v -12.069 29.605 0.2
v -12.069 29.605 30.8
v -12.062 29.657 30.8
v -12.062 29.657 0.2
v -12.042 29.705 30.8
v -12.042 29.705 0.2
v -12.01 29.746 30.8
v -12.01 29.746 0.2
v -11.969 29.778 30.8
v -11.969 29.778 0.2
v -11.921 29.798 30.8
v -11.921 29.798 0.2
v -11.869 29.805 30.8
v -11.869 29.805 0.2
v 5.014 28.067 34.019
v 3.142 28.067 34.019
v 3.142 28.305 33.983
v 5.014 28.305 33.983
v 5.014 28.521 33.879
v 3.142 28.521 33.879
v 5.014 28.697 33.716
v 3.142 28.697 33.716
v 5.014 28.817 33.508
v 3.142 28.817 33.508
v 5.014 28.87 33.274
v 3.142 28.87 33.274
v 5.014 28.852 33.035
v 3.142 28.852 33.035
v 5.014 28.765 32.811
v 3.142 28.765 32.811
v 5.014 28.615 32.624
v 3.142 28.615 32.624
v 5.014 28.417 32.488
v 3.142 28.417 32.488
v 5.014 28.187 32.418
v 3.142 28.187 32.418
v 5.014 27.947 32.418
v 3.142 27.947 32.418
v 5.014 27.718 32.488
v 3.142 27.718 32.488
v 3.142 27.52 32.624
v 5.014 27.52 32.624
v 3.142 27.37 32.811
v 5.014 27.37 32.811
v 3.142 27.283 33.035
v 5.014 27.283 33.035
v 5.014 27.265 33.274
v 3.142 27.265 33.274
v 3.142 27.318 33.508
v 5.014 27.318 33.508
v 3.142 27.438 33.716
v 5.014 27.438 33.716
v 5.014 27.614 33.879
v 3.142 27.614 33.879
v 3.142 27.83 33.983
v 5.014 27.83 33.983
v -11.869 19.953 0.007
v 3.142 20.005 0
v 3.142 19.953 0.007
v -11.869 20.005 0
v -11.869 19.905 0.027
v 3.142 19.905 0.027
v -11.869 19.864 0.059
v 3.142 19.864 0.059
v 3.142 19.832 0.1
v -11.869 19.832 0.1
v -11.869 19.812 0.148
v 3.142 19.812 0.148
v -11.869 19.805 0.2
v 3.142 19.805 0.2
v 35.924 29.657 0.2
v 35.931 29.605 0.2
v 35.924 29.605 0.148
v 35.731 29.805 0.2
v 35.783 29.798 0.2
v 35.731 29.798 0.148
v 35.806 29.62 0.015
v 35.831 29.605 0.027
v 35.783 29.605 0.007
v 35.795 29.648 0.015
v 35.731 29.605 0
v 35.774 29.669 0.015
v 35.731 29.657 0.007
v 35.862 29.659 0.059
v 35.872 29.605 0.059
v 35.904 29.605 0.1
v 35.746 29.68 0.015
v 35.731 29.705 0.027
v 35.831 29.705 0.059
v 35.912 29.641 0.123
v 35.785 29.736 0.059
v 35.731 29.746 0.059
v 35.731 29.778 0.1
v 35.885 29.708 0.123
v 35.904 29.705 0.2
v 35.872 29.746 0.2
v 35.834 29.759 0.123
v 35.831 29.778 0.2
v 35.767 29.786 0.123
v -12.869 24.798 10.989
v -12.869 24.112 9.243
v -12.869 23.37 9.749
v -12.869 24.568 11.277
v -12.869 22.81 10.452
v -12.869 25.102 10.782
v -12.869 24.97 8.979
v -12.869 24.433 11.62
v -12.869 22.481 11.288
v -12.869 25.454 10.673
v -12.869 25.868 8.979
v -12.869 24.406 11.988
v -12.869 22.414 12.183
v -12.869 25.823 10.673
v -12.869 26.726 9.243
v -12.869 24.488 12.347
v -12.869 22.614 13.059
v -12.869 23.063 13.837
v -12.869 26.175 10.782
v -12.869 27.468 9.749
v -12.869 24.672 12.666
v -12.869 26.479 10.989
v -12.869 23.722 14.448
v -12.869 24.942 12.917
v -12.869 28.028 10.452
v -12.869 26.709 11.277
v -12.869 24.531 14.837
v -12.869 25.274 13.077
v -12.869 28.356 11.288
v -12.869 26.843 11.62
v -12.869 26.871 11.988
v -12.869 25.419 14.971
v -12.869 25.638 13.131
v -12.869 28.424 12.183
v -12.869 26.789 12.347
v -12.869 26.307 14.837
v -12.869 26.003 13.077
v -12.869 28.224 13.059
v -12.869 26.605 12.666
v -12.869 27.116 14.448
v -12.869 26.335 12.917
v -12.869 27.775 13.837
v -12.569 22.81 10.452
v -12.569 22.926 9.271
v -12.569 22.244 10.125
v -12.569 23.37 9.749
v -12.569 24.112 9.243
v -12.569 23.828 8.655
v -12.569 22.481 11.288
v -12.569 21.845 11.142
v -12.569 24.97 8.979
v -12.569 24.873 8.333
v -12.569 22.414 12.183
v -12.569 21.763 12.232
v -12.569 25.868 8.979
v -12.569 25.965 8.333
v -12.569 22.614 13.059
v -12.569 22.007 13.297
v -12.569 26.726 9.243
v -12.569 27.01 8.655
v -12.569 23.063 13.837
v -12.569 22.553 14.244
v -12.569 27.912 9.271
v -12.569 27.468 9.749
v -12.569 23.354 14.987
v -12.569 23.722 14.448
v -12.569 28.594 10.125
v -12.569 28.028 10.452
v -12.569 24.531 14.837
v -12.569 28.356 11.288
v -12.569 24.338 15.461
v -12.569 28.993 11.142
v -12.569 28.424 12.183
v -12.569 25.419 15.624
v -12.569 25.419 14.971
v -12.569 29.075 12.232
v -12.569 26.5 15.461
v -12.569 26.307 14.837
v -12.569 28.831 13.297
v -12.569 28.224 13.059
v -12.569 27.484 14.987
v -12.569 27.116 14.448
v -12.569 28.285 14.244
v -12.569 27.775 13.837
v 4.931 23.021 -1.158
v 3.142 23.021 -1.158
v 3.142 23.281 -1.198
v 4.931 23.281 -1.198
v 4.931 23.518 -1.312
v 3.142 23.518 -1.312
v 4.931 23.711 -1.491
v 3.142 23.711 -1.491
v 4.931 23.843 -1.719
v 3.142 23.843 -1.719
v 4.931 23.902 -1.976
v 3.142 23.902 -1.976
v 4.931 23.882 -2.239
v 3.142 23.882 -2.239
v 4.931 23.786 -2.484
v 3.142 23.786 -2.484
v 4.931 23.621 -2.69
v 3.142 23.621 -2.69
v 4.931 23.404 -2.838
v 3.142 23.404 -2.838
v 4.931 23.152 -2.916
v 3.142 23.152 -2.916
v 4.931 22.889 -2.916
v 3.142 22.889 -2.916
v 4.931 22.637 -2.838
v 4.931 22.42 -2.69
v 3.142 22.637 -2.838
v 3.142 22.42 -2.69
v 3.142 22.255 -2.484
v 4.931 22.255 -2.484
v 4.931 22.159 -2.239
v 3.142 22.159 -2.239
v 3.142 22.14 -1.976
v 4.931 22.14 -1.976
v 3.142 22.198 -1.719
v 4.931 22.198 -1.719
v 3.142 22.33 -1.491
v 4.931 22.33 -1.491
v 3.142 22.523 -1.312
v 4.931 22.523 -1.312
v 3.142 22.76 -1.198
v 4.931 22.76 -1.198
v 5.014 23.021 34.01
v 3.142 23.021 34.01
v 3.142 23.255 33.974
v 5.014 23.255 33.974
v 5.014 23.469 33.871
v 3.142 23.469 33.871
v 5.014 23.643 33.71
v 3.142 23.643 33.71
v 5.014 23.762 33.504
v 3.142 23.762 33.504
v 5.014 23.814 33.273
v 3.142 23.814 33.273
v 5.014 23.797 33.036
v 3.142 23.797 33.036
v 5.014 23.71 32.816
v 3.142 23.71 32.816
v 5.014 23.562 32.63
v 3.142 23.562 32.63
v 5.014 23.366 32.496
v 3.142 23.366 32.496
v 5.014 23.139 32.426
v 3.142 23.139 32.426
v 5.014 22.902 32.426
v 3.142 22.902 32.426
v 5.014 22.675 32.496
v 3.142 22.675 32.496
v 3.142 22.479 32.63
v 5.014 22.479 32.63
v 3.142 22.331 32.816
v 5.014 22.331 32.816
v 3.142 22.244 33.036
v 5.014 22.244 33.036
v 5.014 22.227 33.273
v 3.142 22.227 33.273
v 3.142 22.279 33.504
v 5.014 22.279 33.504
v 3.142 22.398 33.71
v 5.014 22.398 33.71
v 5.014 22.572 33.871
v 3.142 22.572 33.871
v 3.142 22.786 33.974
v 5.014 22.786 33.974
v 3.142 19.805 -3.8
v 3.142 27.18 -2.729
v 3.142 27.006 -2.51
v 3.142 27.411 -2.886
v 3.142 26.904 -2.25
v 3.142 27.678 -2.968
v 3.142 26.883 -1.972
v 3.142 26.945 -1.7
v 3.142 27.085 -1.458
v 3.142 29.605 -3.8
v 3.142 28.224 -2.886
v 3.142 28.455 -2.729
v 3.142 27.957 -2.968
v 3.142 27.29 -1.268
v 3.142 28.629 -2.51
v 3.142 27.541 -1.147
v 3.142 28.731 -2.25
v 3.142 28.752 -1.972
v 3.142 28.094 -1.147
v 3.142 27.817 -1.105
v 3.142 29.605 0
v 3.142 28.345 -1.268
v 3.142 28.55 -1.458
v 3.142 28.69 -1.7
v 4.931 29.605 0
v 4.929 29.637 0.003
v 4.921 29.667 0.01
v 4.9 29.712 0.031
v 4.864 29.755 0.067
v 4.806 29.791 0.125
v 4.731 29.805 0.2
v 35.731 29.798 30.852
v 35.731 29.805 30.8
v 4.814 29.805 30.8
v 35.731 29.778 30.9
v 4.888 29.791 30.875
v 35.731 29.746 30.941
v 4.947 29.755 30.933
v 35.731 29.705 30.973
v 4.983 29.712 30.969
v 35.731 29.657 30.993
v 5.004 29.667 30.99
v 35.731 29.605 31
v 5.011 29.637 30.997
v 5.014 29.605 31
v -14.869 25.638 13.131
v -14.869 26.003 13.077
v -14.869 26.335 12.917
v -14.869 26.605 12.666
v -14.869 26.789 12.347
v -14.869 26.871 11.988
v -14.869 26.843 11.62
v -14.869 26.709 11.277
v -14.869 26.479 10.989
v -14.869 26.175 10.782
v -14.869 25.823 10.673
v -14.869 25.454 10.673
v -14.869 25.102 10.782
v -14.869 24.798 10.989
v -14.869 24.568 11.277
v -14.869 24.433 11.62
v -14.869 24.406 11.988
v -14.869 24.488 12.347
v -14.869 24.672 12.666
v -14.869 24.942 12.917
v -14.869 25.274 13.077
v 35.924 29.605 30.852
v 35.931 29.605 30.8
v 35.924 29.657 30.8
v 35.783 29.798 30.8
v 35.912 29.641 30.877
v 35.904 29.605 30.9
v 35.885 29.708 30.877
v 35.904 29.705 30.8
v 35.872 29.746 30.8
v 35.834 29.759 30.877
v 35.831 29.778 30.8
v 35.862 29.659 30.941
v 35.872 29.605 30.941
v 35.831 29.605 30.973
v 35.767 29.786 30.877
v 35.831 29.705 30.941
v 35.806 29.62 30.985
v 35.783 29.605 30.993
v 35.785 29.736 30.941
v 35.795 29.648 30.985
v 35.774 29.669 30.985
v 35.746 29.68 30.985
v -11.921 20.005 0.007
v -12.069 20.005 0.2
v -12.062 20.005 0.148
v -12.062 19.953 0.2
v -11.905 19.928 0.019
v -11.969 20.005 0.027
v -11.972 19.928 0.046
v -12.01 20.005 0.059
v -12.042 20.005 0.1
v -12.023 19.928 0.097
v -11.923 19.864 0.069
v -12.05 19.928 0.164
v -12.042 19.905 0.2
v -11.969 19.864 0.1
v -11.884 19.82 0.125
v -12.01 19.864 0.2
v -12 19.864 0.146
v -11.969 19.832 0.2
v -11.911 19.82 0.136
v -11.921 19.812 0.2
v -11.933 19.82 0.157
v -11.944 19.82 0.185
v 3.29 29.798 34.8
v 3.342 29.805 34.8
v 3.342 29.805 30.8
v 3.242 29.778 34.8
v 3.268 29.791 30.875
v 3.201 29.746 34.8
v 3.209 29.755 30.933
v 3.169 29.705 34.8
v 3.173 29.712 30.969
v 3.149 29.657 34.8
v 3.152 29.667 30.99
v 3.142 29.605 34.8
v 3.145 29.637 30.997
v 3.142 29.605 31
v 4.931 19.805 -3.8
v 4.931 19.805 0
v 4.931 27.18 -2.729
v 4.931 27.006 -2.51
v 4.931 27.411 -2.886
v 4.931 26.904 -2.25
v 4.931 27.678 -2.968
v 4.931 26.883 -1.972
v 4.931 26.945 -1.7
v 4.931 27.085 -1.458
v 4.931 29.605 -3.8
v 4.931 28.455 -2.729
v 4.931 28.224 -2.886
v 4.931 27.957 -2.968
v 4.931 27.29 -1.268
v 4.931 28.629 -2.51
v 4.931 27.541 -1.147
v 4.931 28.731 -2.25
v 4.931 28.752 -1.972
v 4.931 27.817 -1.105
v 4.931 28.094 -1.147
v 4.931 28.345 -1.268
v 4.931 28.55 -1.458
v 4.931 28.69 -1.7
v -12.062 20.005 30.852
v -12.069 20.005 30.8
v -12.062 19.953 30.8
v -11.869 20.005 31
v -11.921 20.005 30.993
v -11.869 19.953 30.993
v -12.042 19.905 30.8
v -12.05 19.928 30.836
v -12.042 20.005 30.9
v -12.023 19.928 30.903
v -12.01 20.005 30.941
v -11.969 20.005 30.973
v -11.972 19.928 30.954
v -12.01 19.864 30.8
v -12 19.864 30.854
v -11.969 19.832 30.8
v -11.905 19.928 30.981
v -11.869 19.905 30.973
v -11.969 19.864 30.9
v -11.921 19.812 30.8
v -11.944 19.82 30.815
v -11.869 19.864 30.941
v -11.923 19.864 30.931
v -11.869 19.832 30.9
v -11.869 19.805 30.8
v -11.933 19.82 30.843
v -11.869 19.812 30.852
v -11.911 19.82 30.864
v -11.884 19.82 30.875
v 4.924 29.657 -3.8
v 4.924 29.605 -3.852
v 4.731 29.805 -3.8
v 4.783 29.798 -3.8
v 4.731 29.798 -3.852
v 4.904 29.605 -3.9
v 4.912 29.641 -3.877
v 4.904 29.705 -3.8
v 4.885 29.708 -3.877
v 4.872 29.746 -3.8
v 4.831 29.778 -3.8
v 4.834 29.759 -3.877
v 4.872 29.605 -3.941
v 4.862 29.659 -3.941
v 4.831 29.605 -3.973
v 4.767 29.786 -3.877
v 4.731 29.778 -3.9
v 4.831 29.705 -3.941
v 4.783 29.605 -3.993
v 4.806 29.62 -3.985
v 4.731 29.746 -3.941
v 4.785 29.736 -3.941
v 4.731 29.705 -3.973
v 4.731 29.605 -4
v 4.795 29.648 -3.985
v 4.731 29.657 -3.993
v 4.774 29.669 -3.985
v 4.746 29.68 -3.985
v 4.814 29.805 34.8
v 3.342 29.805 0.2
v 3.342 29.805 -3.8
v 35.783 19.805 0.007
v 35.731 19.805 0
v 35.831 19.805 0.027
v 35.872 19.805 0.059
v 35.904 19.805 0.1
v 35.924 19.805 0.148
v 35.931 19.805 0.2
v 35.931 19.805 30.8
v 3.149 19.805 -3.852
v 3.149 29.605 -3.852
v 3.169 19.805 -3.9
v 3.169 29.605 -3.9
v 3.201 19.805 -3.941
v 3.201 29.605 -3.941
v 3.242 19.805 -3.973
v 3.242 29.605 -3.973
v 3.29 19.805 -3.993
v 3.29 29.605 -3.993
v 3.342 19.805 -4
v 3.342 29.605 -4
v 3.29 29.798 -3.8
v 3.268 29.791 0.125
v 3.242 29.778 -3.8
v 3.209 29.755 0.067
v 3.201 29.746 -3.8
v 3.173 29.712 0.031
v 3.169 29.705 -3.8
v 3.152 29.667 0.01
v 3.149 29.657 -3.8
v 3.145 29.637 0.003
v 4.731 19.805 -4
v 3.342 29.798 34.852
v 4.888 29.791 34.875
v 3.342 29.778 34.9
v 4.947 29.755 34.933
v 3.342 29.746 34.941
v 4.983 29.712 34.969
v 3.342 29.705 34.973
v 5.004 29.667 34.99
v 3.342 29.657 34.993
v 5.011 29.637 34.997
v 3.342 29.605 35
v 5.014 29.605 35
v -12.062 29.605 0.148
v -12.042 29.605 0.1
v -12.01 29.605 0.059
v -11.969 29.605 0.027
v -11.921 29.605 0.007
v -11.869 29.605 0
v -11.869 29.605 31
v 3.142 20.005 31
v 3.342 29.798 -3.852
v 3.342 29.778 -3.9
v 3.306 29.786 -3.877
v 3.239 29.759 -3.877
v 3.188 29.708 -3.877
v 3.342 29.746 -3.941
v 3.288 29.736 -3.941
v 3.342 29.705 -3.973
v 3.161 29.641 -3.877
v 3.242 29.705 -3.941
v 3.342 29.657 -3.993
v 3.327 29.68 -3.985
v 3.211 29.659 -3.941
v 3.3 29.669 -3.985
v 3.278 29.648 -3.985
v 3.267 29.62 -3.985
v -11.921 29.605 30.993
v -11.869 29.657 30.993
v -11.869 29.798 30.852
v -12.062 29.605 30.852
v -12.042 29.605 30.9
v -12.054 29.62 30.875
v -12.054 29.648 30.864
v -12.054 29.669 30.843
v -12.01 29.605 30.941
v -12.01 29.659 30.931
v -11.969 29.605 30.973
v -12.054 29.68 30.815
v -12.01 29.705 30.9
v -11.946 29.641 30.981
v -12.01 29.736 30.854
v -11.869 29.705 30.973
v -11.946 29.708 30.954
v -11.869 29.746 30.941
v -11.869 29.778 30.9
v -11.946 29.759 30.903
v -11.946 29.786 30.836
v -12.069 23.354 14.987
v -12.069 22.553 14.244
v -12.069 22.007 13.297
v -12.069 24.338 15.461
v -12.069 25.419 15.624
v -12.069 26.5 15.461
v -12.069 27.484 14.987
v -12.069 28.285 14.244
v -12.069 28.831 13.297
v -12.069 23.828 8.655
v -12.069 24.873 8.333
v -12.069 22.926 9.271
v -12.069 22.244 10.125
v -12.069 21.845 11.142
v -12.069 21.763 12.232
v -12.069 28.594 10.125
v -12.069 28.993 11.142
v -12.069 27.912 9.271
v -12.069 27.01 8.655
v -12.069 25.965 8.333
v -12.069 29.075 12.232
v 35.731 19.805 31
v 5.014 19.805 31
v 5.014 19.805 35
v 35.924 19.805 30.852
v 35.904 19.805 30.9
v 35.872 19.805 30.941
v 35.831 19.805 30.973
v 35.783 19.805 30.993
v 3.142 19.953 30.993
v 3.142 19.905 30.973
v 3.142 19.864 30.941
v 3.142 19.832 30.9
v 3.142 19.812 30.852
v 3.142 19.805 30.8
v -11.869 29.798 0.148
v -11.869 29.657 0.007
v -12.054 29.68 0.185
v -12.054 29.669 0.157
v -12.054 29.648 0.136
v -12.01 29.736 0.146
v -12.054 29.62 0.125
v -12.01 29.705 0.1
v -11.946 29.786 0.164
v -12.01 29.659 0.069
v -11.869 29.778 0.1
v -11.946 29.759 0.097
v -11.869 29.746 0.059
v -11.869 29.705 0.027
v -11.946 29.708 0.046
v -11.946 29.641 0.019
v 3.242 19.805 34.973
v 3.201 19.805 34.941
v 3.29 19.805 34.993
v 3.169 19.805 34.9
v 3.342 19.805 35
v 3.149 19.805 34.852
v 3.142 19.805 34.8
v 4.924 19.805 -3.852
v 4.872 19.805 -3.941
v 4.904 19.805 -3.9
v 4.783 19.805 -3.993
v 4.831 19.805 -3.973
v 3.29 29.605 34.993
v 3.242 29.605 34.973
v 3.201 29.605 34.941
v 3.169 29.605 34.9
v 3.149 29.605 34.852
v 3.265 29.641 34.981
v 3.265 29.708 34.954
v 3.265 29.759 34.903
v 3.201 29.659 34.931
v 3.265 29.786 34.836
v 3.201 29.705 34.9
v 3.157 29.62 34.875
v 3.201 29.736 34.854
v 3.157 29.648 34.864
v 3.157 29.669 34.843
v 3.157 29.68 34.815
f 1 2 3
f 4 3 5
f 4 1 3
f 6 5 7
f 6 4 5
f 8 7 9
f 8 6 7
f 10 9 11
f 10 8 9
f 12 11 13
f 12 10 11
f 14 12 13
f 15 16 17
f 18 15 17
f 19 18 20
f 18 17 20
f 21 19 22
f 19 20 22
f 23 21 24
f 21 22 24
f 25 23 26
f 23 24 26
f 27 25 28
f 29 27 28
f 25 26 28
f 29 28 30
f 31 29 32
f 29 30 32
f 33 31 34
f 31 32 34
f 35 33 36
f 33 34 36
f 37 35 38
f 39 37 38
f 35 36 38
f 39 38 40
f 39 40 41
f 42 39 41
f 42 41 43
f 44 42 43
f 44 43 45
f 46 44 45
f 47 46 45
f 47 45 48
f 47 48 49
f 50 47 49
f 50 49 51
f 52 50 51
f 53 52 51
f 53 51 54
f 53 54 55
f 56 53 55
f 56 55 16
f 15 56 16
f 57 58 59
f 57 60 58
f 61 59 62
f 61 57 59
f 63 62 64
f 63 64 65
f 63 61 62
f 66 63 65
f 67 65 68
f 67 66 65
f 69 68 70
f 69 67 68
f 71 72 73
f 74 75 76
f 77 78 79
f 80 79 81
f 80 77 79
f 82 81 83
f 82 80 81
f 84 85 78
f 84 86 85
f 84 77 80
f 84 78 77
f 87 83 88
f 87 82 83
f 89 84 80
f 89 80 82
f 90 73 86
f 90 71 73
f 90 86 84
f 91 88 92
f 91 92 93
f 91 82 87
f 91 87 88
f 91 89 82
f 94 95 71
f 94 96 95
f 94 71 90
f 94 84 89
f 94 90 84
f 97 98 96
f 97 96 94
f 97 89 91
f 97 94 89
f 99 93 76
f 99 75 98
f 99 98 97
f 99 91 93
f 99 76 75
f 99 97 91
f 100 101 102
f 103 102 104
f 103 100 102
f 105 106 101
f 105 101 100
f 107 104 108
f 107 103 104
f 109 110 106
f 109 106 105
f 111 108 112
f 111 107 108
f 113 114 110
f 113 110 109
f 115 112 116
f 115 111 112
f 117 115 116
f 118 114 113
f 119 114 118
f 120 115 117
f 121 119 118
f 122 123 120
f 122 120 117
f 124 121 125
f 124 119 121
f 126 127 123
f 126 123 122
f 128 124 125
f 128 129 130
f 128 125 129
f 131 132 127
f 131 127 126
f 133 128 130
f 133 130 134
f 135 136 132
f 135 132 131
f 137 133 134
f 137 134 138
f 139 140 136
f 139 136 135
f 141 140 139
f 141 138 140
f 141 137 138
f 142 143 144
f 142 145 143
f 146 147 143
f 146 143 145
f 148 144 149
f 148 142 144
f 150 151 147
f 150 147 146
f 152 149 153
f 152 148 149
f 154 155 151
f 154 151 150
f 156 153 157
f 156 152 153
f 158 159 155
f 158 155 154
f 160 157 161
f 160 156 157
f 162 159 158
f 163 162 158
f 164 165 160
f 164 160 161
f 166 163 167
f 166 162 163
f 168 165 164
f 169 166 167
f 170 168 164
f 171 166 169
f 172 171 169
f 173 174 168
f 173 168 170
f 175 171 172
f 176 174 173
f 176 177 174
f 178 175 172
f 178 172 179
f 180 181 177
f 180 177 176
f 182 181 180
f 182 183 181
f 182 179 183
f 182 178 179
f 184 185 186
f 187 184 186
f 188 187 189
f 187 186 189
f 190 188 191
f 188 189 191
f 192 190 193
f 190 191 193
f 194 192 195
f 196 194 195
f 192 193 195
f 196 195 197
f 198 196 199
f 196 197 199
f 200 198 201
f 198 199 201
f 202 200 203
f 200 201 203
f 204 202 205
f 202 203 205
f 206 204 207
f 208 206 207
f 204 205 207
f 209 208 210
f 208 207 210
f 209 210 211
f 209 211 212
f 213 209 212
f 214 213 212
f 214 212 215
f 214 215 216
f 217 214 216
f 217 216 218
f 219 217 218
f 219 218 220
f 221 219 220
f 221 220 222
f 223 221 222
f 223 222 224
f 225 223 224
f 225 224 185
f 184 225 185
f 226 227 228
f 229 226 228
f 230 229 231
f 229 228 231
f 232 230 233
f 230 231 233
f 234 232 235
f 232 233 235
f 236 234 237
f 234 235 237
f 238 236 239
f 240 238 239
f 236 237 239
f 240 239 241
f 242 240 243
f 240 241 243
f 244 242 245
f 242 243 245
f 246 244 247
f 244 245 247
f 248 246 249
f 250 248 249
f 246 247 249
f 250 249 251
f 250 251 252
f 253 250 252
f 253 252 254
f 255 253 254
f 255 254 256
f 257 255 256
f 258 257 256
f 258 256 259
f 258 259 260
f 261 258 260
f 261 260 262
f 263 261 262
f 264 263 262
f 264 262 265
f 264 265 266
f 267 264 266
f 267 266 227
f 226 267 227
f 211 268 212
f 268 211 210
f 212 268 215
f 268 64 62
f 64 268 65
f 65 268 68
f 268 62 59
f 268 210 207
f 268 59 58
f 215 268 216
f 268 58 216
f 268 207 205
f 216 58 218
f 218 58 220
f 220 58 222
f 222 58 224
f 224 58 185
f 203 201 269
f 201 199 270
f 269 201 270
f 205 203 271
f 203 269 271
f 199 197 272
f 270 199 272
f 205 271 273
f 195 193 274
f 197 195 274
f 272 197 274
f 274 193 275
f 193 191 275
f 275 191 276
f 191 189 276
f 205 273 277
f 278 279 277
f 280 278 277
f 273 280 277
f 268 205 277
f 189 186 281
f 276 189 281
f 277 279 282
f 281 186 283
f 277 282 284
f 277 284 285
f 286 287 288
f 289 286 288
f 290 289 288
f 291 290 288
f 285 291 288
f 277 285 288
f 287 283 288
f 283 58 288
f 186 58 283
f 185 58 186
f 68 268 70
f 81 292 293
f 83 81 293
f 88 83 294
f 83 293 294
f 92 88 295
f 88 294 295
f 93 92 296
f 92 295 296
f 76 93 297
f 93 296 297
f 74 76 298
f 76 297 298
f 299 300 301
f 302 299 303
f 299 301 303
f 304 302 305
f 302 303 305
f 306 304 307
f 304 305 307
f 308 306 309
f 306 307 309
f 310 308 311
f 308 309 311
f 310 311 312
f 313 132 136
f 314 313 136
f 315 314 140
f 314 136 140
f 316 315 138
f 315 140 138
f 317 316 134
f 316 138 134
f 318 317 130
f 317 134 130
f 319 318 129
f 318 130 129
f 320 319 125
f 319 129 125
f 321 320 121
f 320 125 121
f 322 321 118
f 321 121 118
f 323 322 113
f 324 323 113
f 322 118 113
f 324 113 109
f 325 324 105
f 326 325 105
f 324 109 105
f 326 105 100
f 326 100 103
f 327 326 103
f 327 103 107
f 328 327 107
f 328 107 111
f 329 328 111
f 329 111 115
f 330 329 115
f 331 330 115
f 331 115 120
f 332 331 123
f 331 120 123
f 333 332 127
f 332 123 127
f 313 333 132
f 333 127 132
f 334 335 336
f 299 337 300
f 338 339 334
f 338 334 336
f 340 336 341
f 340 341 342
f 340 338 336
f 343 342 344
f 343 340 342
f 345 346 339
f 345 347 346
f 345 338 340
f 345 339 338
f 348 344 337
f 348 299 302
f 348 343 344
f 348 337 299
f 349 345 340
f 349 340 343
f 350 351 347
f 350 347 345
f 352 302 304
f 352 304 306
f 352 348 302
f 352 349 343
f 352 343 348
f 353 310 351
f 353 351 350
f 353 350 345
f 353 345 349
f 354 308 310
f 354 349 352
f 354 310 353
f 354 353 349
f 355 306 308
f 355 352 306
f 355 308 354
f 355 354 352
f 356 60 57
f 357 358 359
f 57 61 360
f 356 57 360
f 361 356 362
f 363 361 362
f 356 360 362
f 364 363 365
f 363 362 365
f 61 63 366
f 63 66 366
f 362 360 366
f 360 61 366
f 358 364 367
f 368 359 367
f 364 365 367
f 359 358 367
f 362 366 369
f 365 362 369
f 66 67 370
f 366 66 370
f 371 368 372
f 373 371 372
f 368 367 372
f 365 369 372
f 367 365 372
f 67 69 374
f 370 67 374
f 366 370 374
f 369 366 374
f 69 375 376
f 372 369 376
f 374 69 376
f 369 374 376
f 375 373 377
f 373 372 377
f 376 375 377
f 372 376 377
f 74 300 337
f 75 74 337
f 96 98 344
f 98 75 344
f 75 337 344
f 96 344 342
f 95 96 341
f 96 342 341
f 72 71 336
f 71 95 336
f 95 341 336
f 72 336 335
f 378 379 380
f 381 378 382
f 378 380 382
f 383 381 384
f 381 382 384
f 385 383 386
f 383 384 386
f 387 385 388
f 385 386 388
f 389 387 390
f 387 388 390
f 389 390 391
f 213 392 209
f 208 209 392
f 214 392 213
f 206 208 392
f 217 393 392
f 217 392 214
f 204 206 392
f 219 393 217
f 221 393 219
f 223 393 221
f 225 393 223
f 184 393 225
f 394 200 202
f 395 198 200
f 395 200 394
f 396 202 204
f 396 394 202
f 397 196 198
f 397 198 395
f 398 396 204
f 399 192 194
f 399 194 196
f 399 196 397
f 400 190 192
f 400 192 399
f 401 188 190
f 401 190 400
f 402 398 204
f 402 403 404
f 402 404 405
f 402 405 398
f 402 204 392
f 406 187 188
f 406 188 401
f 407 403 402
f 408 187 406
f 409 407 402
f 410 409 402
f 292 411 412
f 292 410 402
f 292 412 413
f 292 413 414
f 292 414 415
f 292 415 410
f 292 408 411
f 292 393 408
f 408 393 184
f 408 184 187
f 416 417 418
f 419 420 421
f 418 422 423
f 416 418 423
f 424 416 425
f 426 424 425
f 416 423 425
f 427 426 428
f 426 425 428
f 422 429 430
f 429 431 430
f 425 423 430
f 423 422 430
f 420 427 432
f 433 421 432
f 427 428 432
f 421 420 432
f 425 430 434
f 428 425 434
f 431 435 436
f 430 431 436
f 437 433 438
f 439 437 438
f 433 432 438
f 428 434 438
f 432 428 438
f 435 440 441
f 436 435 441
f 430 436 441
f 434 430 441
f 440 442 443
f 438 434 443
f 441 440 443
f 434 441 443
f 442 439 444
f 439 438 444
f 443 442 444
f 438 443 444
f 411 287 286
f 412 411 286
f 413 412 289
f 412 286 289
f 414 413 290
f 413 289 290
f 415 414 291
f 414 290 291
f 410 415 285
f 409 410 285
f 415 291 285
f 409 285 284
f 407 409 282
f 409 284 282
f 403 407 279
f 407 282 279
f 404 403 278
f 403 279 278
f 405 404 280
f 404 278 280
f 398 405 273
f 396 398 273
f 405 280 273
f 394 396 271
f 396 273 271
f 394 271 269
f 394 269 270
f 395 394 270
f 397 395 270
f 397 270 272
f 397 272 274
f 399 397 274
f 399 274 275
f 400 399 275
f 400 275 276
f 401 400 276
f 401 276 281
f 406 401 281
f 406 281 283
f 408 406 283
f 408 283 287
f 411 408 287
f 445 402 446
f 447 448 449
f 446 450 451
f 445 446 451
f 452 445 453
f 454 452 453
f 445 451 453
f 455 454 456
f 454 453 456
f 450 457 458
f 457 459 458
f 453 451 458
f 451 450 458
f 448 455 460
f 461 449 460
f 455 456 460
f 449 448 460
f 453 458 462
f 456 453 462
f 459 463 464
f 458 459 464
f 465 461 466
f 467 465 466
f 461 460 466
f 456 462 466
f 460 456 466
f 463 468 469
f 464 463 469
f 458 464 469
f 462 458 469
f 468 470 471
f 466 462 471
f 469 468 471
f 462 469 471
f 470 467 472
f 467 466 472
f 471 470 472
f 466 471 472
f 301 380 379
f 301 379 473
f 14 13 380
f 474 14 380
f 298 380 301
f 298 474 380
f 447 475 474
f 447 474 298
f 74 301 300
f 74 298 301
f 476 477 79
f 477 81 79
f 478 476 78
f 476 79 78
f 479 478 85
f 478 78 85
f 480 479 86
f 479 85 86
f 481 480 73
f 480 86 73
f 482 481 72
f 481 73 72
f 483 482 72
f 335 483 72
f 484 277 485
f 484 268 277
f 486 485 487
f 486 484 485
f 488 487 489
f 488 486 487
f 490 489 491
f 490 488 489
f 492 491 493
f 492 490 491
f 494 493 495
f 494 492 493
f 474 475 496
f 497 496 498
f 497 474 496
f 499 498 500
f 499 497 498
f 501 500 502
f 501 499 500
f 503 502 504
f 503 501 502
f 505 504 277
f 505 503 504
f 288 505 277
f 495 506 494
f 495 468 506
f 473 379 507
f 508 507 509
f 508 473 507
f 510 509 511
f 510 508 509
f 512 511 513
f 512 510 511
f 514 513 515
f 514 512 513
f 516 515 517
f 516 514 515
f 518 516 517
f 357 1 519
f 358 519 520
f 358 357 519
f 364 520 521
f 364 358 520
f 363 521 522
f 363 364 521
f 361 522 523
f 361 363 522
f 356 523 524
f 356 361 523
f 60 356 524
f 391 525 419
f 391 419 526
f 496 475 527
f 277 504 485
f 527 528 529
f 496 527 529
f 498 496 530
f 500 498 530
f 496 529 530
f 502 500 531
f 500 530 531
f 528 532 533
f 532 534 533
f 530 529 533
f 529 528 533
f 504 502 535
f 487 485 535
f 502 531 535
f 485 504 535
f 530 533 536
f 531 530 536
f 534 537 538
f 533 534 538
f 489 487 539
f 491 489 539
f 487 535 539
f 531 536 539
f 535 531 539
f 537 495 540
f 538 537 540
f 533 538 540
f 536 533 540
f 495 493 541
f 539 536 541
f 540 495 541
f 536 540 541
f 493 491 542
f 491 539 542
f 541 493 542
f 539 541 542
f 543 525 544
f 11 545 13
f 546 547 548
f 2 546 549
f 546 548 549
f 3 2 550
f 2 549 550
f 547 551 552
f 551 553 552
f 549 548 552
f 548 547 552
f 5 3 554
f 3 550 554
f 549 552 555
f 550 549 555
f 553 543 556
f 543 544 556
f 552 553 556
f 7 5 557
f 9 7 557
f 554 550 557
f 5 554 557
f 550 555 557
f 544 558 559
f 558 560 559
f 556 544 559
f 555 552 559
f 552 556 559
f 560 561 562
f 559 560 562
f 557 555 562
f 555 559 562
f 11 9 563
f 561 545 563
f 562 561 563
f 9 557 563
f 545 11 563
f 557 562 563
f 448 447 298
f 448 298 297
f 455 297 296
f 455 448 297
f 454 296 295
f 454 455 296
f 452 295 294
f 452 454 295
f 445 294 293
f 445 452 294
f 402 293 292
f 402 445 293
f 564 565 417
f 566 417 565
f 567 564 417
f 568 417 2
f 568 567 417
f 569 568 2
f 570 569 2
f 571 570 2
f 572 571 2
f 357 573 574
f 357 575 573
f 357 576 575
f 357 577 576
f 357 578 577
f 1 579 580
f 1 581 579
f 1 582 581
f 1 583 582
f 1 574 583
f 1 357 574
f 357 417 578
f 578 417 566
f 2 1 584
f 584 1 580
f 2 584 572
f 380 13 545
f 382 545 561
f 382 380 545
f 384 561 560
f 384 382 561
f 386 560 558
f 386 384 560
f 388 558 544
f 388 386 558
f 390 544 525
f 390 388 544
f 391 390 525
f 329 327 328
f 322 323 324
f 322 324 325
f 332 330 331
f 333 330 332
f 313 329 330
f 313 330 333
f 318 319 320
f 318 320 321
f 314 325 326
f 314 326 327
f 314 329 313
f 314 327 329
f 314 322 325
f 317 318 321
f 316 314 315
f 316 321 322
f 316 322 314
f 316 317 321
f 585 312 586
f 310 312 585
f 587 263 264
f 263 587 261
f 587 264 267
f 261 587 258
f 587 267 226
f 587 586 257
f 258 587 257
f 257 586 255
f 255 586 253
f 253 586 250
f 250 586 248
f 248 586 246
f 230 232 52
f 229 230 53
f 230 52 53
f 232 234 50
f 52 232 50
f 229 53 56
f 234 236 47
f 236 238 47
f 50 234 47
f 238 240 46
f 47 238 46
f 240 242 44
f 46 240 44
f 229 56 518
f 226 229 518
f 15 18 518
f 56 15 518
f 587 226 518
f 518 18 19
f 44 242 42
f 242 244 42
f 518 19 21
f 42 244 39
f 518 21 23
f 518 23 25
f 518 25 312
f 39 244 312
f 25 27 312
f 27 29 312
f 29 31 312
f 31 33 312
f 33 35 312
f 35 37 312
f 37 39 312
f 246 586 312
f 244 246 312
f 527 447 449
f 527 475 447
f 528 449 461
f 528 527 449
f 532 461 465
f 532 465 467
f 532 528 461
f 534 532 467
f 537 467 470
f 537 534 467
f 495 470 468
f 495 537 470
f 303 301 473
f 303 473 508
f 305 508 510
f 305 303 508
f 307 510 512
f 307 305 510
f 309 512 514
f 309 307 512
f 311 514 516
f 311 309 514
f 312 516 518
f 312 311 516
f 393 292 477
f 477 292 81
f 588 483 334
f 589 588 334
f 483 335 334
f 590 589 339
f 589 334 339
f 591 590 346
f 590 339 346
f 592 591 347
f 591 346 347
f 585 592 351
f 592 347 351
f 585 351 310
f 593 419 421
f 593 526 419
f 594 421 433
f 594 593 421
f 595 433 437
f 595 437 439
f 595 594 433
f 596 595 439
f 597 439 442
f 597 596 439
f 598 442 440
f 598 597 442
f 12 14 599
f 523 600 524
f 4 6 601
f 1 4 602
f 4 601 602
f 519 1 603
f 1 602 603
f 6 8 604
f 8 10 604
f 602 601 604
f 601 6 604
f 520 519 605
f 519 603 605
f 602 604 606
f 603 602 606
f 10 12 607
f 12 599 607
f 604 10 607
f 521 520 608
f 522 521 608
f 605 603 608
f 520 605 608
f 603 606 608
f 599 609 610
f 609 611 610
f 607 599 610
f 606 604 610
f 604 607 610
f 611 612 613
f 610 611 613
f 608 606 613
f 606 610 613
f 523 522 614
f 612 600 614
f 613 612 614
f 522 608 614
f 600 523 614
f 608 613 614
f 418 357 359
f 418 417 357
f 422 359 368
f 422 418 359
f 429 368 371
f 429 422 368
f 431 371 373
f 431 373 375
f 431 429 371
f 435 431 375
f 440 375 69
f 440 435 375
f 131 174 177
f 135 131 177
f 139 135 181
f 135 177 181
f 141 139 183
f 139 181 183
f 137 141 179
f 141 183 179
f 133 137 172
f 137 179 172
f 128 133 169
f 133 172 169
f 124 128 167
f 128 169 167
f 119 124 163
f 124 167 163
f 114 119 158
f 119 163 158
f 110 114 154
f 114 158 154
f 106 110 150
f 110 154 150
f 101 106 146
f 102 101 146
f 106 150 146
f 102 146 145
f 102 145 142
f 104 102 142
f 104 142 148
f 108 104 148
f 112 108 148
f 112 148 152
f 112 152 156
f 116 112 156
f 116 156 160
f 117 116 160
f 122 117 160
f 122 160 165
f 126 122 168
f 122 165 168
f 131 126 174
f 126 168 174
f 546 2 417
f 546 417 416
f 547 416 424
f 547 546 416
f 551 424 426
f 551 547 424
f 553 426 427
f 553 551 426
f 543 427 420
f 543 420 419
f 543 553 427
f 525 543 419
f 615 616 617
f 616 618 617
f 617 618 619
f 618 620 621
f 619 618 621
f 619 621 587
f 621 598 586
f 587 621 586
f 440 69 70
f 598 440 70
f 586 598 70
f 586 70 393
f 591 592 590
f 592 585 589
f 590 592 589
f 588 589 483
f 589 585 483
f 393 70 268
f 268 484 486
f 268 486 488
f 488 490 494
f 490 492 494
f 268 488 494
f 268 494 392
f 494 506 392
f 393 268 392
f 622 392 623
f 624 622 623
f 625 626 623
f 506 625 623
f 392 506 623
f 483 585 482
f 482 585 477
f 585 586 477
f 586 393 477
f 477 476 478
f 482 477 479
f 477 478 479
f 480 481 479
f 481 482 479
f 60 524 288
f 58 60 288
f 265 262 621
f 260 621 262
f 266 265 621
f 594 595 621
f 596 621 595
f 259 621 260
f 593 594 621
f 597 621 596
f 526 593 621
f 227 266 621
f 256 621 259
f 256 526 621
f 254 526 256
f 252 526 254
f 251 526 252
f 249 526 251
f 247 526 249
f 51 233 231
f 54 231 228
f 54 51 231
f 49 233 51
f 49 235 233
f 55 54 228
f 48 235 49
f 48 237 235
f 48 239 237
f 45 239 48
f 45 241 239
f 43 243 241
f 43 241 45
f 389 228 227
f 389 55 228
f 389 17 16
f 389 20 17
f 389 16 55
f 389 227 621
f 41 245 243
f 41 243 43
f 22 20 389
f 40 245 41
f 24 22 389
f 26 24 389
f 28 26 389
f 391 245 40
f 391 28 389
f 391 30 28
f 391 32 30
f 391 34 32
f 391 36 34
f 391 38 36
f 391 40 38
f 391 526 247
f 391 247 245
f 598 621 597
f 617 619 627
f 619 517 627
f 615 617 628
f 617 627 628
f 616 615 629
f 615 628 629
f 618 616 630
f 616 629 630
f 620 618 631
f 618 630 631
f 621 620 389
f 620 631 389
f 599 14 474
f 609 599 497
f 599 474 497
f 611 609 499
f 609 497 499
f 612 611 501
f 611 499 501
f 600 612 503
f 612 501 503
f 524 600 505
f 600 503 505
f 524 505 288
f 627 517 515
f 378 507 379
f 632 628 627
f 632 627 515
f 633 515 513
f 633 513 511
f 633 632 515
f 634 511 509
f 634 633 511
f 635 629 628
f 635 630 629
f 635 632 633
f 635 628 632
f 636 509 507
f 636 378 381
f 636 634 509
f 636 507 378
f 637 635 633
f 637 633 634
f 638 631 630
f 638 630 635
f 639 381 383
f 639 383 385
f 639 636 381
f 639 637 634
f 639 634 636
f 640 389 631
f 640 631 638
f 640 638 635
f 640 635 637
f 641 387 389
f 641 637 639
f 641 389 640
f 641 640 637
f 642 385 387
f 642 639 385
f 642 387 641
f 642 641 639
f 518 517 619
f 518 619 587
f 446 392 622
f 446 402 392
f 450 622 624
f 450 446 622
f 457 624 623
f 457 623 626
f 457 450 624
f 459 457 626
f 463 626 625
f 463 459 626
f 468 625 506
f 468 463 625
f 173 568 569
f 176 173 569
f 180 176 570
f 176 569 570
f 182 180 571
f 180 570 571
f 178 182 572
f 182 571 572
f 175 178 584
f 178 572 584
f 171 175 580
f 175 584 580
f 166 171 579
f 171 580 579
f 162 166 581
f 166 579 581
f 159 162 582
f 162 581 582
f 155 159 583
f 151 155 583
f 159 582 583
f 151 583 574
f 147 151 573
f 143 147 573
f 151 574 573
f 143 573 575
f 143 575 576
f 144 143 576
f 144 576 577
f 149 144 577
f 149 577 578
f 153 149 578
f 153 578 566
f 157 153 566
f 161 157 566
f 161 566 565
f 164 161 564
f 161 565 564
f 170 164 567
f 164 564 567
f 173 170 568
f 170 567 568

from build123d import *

# Parameters (mm, degrees)
SKETCH_1_W          = 48
SKETCH_1_H          = 10
EXTRUDE_1_DEPTH     = 31
SKETCH_4_W          = 1.788999432
SKETCH_4_H          = 10
EXTRUDE_2_DEPTH     = 4
SKETCH_14_W         = 1.871956719
SKETCH_14_H         = 10
EXTRUDE_4_DEPTH     = 4
SKETCH_15_R         = 3.665821214
EXTRUDE_5_DEPTH     = 0.5
SKETCH_16_R         = 3.013049761
EXTRUDE_6_DEPTH     = 0.3
SKETCH_17_R         = 1.236050747
EXTRUDE_8_DEPTH     = 2
SKETCH_22_R         = 0.88346166
SKETCH_22_R_2       = 0.936856128
CUT_EXTRUDE_1_DEPTH = 5
SKETCH_23_R         = 0.805014206
SKETCH_23_R_2       = 0.796081263
CUT_EXTRUDE_2_DEPTH = 5
FILLET_3_R          = 0.2
FILLET_4_R          = 0.2
FILLET_5_R          = 0.2
FILLET_6_R          = 0.2
FILLET_7_R          = 0.2
FILLET_8_R          = 0.2
FILLET_9_R          = 0.2
FILLET_10_R         = 0.2


with BuildPart() as part:
    # 草图1 → 凸台-拉伸1 (new body)
    with BuildSketch(Plane.XY):
        with Locations((11.931034483, 24.804987121)):
            Rectangle(SKETCH_1_W, SKETCH_1_H)
    extrude(amount=EXTRUDE_1_DEPTH)

    # 草图4 → 凸台-拉伸2 (add)
    with BuildSketch(Plane(origin=(0, 0, 0), x_dir=(-1, 0, 0), z_dir=(0, 0, -1))):
        with Locations((-4.036534767, 24.804987121)):
            Rectangle(SKETCH_4_W, SKETCH_4_H)
    extrude(amount=EXTRUDE_2_DEPTH)

    # 草图14 → 凸台-拉伸4 (add)
    with BuildSketch(Plane.XY.offset(31)):
        with Locations((4.078013411, 24.804987121)):
            Rectangle(SKETCH_14_W, SKETCH_14_H)
    extrude(amount=EXTRUDE_4_DEPTH)

    # 草图15 → 凸台-拉伸5 (add)
    with BuildSketch(Plane.ZY.offset(12.068965517)):
        with Locations((11.958075482, 25.418989077)):
            Circle(SKETCH_15_R)
    extrude(amount=EXTRUDE_5_DEPTH)

    # 草图16 → 凸台-拉伸6 (add)
    with BuildSketch(Plane.ZY.offset(12.568965517)):
        with Locations((11.958075482, 25.418989077)):
            Circle(SKETCH_16_R)
    extrude(amount=EXTRUDE_6_DEPTH)

    # 草图17 → 凸台-拉伸8 (add)
    with BuildSketch(Plane.ZY.offset(12.868965517)):
        with Locations((11.895385931, 25.638311879)):
            Circle(SKETCH_17_R)
    extrude(amount=EXTRUDE_8_DEPTH)

    # 草图22 → 切除-拉伸1 (cut)
    with BuildSketch(Plane.ZY.offset(-3.142035051)):
        with Locations((-2.041924518, 23.020543935)):
            Circle(SKETCH_22_R)
        with Locations((-2.041924518, 27.817434219)):
            Circle(SKETCH_22_R_2)
    extrude(amount=-CUT_EXTRUDE_1_DEPTH, mode=Mode.SUBTRACT)

    # 草图23 → 切除-拉伸2 (cut)
    with BuildSketch(Plane.ZY.offset(-3.142035051)):
        with Locations((33.213635659, 28.067477757)):
            Circle(SKETCH_23_R)
        with Locations((33.213635659, 23.020543935)):
            Circle(SKETCH_23_R_2)
    extrude(amount=-CUT_EXTRUDE_2_DEPTH, mode=Mode.SUBTRACT)

    # 圆角3
    fillet_3_edges = [part.edges().sort_by_distance(p)[0] for p in [
        (35.931034483, 29.804987121, 15.5),
    ]]
    fillet(fillet_3_edges, radius=FILLET_3_R)

    # 圆角4
    fillet_4_edges = [part.edges().sort_by_distance(p)[0] for p in [
        (-4.463465233, 29.804987121, 0),
        (35.931034483, 24.704987121, 0),
        (20.331034483, 29.804987121, 0),
        (35.872455839, 29.746408477, 0),
    ]]
    fillet(fillet_4_edges, radius=FILLET_4_R)

    # 圆角5
    fillet_5_edges = [part.edges().sort_by_distance(p)[0] for p in [
        (4.931034483, 29.804987121, -2),
        (3.142035051, 29.804987121, -2),
    ]]
    fillet(fillet_5_edges, radius=FILLET_5_R)

    # 圆角6
    fillet_6_edges = [part.edges().sort_by_distance(p)[0] for p in [
        (4.931034483, 24.704987121, -4),
        (4.036534767, 29.804987121, -4),
        (3.200613695, 29.746408477, -4),
        (4.872455839, 29.746408477, -4),
        (35.931034483, 24.704987121, 31),
        (3.142035051, 24.704987121, -4),
        (20.372513126, 29.804987121, 31),
        (35.872455839, 29.746408477, 31),
    ]]
    fillet(fillet_6_edges, radius=FILLET_6_R)

    # 圆角7
    fillet_7_edges = [part.edges().sort_by_distance(p)[0] for p in [
        (4.07801341, 29.804987121, 35),
        (5.01399177, 29.804987121, 33),
    ]]
    fillet(fillet_7_edges, radius=FILLET_7_R)

    # 圆角8
    fillet_8_edges = [part.edges().sort_by_distance(p)[0] for p in [
        (3.142035051, 24.704987121, 35),
        (3.142035051, 29.804987121, 32.9),
        (3.142035051, 29.746408477, 34.941421356),
        (-4.463465233, 29.804987121, 31),
    ]]
    fillet(fillet_8_edges, radius=FILLET_8_R)

    # 圆角9
    fillet_9_edges = [part.edges().sort_by_distance(p)[0] for p in [
        (-12.068965517, 24.704987121, 31),
        (-12.068965517, 29.804987121, 15.5),
        (-12.068965517, 29.746408477, 30.941421356),
        (-12.068965517, 24.704987121, 0),
        (-12.068965517, 29.746408477, 0.058578644),
    ]]
    fillet(fillet_9_edges, radius=FILLET_9_R)

    # 圆角10
    fillet_10_edges = [part.edges().sort_by_distance(p)[0] for p in [
        (-12.068965517, 19.804987121, 15.5),
        (-4.363465233, 19.804987121, 31),
        (-4.363465233, 19.804987121, 0),
        (-12.010386873, 19.804987121, 30.941421356),
        (-12.010386873, 19.804987121, 0.058578644),
    ]]
    fillet(fillet_10_edges, radius=FILLET_10_R)


solid = part.part
